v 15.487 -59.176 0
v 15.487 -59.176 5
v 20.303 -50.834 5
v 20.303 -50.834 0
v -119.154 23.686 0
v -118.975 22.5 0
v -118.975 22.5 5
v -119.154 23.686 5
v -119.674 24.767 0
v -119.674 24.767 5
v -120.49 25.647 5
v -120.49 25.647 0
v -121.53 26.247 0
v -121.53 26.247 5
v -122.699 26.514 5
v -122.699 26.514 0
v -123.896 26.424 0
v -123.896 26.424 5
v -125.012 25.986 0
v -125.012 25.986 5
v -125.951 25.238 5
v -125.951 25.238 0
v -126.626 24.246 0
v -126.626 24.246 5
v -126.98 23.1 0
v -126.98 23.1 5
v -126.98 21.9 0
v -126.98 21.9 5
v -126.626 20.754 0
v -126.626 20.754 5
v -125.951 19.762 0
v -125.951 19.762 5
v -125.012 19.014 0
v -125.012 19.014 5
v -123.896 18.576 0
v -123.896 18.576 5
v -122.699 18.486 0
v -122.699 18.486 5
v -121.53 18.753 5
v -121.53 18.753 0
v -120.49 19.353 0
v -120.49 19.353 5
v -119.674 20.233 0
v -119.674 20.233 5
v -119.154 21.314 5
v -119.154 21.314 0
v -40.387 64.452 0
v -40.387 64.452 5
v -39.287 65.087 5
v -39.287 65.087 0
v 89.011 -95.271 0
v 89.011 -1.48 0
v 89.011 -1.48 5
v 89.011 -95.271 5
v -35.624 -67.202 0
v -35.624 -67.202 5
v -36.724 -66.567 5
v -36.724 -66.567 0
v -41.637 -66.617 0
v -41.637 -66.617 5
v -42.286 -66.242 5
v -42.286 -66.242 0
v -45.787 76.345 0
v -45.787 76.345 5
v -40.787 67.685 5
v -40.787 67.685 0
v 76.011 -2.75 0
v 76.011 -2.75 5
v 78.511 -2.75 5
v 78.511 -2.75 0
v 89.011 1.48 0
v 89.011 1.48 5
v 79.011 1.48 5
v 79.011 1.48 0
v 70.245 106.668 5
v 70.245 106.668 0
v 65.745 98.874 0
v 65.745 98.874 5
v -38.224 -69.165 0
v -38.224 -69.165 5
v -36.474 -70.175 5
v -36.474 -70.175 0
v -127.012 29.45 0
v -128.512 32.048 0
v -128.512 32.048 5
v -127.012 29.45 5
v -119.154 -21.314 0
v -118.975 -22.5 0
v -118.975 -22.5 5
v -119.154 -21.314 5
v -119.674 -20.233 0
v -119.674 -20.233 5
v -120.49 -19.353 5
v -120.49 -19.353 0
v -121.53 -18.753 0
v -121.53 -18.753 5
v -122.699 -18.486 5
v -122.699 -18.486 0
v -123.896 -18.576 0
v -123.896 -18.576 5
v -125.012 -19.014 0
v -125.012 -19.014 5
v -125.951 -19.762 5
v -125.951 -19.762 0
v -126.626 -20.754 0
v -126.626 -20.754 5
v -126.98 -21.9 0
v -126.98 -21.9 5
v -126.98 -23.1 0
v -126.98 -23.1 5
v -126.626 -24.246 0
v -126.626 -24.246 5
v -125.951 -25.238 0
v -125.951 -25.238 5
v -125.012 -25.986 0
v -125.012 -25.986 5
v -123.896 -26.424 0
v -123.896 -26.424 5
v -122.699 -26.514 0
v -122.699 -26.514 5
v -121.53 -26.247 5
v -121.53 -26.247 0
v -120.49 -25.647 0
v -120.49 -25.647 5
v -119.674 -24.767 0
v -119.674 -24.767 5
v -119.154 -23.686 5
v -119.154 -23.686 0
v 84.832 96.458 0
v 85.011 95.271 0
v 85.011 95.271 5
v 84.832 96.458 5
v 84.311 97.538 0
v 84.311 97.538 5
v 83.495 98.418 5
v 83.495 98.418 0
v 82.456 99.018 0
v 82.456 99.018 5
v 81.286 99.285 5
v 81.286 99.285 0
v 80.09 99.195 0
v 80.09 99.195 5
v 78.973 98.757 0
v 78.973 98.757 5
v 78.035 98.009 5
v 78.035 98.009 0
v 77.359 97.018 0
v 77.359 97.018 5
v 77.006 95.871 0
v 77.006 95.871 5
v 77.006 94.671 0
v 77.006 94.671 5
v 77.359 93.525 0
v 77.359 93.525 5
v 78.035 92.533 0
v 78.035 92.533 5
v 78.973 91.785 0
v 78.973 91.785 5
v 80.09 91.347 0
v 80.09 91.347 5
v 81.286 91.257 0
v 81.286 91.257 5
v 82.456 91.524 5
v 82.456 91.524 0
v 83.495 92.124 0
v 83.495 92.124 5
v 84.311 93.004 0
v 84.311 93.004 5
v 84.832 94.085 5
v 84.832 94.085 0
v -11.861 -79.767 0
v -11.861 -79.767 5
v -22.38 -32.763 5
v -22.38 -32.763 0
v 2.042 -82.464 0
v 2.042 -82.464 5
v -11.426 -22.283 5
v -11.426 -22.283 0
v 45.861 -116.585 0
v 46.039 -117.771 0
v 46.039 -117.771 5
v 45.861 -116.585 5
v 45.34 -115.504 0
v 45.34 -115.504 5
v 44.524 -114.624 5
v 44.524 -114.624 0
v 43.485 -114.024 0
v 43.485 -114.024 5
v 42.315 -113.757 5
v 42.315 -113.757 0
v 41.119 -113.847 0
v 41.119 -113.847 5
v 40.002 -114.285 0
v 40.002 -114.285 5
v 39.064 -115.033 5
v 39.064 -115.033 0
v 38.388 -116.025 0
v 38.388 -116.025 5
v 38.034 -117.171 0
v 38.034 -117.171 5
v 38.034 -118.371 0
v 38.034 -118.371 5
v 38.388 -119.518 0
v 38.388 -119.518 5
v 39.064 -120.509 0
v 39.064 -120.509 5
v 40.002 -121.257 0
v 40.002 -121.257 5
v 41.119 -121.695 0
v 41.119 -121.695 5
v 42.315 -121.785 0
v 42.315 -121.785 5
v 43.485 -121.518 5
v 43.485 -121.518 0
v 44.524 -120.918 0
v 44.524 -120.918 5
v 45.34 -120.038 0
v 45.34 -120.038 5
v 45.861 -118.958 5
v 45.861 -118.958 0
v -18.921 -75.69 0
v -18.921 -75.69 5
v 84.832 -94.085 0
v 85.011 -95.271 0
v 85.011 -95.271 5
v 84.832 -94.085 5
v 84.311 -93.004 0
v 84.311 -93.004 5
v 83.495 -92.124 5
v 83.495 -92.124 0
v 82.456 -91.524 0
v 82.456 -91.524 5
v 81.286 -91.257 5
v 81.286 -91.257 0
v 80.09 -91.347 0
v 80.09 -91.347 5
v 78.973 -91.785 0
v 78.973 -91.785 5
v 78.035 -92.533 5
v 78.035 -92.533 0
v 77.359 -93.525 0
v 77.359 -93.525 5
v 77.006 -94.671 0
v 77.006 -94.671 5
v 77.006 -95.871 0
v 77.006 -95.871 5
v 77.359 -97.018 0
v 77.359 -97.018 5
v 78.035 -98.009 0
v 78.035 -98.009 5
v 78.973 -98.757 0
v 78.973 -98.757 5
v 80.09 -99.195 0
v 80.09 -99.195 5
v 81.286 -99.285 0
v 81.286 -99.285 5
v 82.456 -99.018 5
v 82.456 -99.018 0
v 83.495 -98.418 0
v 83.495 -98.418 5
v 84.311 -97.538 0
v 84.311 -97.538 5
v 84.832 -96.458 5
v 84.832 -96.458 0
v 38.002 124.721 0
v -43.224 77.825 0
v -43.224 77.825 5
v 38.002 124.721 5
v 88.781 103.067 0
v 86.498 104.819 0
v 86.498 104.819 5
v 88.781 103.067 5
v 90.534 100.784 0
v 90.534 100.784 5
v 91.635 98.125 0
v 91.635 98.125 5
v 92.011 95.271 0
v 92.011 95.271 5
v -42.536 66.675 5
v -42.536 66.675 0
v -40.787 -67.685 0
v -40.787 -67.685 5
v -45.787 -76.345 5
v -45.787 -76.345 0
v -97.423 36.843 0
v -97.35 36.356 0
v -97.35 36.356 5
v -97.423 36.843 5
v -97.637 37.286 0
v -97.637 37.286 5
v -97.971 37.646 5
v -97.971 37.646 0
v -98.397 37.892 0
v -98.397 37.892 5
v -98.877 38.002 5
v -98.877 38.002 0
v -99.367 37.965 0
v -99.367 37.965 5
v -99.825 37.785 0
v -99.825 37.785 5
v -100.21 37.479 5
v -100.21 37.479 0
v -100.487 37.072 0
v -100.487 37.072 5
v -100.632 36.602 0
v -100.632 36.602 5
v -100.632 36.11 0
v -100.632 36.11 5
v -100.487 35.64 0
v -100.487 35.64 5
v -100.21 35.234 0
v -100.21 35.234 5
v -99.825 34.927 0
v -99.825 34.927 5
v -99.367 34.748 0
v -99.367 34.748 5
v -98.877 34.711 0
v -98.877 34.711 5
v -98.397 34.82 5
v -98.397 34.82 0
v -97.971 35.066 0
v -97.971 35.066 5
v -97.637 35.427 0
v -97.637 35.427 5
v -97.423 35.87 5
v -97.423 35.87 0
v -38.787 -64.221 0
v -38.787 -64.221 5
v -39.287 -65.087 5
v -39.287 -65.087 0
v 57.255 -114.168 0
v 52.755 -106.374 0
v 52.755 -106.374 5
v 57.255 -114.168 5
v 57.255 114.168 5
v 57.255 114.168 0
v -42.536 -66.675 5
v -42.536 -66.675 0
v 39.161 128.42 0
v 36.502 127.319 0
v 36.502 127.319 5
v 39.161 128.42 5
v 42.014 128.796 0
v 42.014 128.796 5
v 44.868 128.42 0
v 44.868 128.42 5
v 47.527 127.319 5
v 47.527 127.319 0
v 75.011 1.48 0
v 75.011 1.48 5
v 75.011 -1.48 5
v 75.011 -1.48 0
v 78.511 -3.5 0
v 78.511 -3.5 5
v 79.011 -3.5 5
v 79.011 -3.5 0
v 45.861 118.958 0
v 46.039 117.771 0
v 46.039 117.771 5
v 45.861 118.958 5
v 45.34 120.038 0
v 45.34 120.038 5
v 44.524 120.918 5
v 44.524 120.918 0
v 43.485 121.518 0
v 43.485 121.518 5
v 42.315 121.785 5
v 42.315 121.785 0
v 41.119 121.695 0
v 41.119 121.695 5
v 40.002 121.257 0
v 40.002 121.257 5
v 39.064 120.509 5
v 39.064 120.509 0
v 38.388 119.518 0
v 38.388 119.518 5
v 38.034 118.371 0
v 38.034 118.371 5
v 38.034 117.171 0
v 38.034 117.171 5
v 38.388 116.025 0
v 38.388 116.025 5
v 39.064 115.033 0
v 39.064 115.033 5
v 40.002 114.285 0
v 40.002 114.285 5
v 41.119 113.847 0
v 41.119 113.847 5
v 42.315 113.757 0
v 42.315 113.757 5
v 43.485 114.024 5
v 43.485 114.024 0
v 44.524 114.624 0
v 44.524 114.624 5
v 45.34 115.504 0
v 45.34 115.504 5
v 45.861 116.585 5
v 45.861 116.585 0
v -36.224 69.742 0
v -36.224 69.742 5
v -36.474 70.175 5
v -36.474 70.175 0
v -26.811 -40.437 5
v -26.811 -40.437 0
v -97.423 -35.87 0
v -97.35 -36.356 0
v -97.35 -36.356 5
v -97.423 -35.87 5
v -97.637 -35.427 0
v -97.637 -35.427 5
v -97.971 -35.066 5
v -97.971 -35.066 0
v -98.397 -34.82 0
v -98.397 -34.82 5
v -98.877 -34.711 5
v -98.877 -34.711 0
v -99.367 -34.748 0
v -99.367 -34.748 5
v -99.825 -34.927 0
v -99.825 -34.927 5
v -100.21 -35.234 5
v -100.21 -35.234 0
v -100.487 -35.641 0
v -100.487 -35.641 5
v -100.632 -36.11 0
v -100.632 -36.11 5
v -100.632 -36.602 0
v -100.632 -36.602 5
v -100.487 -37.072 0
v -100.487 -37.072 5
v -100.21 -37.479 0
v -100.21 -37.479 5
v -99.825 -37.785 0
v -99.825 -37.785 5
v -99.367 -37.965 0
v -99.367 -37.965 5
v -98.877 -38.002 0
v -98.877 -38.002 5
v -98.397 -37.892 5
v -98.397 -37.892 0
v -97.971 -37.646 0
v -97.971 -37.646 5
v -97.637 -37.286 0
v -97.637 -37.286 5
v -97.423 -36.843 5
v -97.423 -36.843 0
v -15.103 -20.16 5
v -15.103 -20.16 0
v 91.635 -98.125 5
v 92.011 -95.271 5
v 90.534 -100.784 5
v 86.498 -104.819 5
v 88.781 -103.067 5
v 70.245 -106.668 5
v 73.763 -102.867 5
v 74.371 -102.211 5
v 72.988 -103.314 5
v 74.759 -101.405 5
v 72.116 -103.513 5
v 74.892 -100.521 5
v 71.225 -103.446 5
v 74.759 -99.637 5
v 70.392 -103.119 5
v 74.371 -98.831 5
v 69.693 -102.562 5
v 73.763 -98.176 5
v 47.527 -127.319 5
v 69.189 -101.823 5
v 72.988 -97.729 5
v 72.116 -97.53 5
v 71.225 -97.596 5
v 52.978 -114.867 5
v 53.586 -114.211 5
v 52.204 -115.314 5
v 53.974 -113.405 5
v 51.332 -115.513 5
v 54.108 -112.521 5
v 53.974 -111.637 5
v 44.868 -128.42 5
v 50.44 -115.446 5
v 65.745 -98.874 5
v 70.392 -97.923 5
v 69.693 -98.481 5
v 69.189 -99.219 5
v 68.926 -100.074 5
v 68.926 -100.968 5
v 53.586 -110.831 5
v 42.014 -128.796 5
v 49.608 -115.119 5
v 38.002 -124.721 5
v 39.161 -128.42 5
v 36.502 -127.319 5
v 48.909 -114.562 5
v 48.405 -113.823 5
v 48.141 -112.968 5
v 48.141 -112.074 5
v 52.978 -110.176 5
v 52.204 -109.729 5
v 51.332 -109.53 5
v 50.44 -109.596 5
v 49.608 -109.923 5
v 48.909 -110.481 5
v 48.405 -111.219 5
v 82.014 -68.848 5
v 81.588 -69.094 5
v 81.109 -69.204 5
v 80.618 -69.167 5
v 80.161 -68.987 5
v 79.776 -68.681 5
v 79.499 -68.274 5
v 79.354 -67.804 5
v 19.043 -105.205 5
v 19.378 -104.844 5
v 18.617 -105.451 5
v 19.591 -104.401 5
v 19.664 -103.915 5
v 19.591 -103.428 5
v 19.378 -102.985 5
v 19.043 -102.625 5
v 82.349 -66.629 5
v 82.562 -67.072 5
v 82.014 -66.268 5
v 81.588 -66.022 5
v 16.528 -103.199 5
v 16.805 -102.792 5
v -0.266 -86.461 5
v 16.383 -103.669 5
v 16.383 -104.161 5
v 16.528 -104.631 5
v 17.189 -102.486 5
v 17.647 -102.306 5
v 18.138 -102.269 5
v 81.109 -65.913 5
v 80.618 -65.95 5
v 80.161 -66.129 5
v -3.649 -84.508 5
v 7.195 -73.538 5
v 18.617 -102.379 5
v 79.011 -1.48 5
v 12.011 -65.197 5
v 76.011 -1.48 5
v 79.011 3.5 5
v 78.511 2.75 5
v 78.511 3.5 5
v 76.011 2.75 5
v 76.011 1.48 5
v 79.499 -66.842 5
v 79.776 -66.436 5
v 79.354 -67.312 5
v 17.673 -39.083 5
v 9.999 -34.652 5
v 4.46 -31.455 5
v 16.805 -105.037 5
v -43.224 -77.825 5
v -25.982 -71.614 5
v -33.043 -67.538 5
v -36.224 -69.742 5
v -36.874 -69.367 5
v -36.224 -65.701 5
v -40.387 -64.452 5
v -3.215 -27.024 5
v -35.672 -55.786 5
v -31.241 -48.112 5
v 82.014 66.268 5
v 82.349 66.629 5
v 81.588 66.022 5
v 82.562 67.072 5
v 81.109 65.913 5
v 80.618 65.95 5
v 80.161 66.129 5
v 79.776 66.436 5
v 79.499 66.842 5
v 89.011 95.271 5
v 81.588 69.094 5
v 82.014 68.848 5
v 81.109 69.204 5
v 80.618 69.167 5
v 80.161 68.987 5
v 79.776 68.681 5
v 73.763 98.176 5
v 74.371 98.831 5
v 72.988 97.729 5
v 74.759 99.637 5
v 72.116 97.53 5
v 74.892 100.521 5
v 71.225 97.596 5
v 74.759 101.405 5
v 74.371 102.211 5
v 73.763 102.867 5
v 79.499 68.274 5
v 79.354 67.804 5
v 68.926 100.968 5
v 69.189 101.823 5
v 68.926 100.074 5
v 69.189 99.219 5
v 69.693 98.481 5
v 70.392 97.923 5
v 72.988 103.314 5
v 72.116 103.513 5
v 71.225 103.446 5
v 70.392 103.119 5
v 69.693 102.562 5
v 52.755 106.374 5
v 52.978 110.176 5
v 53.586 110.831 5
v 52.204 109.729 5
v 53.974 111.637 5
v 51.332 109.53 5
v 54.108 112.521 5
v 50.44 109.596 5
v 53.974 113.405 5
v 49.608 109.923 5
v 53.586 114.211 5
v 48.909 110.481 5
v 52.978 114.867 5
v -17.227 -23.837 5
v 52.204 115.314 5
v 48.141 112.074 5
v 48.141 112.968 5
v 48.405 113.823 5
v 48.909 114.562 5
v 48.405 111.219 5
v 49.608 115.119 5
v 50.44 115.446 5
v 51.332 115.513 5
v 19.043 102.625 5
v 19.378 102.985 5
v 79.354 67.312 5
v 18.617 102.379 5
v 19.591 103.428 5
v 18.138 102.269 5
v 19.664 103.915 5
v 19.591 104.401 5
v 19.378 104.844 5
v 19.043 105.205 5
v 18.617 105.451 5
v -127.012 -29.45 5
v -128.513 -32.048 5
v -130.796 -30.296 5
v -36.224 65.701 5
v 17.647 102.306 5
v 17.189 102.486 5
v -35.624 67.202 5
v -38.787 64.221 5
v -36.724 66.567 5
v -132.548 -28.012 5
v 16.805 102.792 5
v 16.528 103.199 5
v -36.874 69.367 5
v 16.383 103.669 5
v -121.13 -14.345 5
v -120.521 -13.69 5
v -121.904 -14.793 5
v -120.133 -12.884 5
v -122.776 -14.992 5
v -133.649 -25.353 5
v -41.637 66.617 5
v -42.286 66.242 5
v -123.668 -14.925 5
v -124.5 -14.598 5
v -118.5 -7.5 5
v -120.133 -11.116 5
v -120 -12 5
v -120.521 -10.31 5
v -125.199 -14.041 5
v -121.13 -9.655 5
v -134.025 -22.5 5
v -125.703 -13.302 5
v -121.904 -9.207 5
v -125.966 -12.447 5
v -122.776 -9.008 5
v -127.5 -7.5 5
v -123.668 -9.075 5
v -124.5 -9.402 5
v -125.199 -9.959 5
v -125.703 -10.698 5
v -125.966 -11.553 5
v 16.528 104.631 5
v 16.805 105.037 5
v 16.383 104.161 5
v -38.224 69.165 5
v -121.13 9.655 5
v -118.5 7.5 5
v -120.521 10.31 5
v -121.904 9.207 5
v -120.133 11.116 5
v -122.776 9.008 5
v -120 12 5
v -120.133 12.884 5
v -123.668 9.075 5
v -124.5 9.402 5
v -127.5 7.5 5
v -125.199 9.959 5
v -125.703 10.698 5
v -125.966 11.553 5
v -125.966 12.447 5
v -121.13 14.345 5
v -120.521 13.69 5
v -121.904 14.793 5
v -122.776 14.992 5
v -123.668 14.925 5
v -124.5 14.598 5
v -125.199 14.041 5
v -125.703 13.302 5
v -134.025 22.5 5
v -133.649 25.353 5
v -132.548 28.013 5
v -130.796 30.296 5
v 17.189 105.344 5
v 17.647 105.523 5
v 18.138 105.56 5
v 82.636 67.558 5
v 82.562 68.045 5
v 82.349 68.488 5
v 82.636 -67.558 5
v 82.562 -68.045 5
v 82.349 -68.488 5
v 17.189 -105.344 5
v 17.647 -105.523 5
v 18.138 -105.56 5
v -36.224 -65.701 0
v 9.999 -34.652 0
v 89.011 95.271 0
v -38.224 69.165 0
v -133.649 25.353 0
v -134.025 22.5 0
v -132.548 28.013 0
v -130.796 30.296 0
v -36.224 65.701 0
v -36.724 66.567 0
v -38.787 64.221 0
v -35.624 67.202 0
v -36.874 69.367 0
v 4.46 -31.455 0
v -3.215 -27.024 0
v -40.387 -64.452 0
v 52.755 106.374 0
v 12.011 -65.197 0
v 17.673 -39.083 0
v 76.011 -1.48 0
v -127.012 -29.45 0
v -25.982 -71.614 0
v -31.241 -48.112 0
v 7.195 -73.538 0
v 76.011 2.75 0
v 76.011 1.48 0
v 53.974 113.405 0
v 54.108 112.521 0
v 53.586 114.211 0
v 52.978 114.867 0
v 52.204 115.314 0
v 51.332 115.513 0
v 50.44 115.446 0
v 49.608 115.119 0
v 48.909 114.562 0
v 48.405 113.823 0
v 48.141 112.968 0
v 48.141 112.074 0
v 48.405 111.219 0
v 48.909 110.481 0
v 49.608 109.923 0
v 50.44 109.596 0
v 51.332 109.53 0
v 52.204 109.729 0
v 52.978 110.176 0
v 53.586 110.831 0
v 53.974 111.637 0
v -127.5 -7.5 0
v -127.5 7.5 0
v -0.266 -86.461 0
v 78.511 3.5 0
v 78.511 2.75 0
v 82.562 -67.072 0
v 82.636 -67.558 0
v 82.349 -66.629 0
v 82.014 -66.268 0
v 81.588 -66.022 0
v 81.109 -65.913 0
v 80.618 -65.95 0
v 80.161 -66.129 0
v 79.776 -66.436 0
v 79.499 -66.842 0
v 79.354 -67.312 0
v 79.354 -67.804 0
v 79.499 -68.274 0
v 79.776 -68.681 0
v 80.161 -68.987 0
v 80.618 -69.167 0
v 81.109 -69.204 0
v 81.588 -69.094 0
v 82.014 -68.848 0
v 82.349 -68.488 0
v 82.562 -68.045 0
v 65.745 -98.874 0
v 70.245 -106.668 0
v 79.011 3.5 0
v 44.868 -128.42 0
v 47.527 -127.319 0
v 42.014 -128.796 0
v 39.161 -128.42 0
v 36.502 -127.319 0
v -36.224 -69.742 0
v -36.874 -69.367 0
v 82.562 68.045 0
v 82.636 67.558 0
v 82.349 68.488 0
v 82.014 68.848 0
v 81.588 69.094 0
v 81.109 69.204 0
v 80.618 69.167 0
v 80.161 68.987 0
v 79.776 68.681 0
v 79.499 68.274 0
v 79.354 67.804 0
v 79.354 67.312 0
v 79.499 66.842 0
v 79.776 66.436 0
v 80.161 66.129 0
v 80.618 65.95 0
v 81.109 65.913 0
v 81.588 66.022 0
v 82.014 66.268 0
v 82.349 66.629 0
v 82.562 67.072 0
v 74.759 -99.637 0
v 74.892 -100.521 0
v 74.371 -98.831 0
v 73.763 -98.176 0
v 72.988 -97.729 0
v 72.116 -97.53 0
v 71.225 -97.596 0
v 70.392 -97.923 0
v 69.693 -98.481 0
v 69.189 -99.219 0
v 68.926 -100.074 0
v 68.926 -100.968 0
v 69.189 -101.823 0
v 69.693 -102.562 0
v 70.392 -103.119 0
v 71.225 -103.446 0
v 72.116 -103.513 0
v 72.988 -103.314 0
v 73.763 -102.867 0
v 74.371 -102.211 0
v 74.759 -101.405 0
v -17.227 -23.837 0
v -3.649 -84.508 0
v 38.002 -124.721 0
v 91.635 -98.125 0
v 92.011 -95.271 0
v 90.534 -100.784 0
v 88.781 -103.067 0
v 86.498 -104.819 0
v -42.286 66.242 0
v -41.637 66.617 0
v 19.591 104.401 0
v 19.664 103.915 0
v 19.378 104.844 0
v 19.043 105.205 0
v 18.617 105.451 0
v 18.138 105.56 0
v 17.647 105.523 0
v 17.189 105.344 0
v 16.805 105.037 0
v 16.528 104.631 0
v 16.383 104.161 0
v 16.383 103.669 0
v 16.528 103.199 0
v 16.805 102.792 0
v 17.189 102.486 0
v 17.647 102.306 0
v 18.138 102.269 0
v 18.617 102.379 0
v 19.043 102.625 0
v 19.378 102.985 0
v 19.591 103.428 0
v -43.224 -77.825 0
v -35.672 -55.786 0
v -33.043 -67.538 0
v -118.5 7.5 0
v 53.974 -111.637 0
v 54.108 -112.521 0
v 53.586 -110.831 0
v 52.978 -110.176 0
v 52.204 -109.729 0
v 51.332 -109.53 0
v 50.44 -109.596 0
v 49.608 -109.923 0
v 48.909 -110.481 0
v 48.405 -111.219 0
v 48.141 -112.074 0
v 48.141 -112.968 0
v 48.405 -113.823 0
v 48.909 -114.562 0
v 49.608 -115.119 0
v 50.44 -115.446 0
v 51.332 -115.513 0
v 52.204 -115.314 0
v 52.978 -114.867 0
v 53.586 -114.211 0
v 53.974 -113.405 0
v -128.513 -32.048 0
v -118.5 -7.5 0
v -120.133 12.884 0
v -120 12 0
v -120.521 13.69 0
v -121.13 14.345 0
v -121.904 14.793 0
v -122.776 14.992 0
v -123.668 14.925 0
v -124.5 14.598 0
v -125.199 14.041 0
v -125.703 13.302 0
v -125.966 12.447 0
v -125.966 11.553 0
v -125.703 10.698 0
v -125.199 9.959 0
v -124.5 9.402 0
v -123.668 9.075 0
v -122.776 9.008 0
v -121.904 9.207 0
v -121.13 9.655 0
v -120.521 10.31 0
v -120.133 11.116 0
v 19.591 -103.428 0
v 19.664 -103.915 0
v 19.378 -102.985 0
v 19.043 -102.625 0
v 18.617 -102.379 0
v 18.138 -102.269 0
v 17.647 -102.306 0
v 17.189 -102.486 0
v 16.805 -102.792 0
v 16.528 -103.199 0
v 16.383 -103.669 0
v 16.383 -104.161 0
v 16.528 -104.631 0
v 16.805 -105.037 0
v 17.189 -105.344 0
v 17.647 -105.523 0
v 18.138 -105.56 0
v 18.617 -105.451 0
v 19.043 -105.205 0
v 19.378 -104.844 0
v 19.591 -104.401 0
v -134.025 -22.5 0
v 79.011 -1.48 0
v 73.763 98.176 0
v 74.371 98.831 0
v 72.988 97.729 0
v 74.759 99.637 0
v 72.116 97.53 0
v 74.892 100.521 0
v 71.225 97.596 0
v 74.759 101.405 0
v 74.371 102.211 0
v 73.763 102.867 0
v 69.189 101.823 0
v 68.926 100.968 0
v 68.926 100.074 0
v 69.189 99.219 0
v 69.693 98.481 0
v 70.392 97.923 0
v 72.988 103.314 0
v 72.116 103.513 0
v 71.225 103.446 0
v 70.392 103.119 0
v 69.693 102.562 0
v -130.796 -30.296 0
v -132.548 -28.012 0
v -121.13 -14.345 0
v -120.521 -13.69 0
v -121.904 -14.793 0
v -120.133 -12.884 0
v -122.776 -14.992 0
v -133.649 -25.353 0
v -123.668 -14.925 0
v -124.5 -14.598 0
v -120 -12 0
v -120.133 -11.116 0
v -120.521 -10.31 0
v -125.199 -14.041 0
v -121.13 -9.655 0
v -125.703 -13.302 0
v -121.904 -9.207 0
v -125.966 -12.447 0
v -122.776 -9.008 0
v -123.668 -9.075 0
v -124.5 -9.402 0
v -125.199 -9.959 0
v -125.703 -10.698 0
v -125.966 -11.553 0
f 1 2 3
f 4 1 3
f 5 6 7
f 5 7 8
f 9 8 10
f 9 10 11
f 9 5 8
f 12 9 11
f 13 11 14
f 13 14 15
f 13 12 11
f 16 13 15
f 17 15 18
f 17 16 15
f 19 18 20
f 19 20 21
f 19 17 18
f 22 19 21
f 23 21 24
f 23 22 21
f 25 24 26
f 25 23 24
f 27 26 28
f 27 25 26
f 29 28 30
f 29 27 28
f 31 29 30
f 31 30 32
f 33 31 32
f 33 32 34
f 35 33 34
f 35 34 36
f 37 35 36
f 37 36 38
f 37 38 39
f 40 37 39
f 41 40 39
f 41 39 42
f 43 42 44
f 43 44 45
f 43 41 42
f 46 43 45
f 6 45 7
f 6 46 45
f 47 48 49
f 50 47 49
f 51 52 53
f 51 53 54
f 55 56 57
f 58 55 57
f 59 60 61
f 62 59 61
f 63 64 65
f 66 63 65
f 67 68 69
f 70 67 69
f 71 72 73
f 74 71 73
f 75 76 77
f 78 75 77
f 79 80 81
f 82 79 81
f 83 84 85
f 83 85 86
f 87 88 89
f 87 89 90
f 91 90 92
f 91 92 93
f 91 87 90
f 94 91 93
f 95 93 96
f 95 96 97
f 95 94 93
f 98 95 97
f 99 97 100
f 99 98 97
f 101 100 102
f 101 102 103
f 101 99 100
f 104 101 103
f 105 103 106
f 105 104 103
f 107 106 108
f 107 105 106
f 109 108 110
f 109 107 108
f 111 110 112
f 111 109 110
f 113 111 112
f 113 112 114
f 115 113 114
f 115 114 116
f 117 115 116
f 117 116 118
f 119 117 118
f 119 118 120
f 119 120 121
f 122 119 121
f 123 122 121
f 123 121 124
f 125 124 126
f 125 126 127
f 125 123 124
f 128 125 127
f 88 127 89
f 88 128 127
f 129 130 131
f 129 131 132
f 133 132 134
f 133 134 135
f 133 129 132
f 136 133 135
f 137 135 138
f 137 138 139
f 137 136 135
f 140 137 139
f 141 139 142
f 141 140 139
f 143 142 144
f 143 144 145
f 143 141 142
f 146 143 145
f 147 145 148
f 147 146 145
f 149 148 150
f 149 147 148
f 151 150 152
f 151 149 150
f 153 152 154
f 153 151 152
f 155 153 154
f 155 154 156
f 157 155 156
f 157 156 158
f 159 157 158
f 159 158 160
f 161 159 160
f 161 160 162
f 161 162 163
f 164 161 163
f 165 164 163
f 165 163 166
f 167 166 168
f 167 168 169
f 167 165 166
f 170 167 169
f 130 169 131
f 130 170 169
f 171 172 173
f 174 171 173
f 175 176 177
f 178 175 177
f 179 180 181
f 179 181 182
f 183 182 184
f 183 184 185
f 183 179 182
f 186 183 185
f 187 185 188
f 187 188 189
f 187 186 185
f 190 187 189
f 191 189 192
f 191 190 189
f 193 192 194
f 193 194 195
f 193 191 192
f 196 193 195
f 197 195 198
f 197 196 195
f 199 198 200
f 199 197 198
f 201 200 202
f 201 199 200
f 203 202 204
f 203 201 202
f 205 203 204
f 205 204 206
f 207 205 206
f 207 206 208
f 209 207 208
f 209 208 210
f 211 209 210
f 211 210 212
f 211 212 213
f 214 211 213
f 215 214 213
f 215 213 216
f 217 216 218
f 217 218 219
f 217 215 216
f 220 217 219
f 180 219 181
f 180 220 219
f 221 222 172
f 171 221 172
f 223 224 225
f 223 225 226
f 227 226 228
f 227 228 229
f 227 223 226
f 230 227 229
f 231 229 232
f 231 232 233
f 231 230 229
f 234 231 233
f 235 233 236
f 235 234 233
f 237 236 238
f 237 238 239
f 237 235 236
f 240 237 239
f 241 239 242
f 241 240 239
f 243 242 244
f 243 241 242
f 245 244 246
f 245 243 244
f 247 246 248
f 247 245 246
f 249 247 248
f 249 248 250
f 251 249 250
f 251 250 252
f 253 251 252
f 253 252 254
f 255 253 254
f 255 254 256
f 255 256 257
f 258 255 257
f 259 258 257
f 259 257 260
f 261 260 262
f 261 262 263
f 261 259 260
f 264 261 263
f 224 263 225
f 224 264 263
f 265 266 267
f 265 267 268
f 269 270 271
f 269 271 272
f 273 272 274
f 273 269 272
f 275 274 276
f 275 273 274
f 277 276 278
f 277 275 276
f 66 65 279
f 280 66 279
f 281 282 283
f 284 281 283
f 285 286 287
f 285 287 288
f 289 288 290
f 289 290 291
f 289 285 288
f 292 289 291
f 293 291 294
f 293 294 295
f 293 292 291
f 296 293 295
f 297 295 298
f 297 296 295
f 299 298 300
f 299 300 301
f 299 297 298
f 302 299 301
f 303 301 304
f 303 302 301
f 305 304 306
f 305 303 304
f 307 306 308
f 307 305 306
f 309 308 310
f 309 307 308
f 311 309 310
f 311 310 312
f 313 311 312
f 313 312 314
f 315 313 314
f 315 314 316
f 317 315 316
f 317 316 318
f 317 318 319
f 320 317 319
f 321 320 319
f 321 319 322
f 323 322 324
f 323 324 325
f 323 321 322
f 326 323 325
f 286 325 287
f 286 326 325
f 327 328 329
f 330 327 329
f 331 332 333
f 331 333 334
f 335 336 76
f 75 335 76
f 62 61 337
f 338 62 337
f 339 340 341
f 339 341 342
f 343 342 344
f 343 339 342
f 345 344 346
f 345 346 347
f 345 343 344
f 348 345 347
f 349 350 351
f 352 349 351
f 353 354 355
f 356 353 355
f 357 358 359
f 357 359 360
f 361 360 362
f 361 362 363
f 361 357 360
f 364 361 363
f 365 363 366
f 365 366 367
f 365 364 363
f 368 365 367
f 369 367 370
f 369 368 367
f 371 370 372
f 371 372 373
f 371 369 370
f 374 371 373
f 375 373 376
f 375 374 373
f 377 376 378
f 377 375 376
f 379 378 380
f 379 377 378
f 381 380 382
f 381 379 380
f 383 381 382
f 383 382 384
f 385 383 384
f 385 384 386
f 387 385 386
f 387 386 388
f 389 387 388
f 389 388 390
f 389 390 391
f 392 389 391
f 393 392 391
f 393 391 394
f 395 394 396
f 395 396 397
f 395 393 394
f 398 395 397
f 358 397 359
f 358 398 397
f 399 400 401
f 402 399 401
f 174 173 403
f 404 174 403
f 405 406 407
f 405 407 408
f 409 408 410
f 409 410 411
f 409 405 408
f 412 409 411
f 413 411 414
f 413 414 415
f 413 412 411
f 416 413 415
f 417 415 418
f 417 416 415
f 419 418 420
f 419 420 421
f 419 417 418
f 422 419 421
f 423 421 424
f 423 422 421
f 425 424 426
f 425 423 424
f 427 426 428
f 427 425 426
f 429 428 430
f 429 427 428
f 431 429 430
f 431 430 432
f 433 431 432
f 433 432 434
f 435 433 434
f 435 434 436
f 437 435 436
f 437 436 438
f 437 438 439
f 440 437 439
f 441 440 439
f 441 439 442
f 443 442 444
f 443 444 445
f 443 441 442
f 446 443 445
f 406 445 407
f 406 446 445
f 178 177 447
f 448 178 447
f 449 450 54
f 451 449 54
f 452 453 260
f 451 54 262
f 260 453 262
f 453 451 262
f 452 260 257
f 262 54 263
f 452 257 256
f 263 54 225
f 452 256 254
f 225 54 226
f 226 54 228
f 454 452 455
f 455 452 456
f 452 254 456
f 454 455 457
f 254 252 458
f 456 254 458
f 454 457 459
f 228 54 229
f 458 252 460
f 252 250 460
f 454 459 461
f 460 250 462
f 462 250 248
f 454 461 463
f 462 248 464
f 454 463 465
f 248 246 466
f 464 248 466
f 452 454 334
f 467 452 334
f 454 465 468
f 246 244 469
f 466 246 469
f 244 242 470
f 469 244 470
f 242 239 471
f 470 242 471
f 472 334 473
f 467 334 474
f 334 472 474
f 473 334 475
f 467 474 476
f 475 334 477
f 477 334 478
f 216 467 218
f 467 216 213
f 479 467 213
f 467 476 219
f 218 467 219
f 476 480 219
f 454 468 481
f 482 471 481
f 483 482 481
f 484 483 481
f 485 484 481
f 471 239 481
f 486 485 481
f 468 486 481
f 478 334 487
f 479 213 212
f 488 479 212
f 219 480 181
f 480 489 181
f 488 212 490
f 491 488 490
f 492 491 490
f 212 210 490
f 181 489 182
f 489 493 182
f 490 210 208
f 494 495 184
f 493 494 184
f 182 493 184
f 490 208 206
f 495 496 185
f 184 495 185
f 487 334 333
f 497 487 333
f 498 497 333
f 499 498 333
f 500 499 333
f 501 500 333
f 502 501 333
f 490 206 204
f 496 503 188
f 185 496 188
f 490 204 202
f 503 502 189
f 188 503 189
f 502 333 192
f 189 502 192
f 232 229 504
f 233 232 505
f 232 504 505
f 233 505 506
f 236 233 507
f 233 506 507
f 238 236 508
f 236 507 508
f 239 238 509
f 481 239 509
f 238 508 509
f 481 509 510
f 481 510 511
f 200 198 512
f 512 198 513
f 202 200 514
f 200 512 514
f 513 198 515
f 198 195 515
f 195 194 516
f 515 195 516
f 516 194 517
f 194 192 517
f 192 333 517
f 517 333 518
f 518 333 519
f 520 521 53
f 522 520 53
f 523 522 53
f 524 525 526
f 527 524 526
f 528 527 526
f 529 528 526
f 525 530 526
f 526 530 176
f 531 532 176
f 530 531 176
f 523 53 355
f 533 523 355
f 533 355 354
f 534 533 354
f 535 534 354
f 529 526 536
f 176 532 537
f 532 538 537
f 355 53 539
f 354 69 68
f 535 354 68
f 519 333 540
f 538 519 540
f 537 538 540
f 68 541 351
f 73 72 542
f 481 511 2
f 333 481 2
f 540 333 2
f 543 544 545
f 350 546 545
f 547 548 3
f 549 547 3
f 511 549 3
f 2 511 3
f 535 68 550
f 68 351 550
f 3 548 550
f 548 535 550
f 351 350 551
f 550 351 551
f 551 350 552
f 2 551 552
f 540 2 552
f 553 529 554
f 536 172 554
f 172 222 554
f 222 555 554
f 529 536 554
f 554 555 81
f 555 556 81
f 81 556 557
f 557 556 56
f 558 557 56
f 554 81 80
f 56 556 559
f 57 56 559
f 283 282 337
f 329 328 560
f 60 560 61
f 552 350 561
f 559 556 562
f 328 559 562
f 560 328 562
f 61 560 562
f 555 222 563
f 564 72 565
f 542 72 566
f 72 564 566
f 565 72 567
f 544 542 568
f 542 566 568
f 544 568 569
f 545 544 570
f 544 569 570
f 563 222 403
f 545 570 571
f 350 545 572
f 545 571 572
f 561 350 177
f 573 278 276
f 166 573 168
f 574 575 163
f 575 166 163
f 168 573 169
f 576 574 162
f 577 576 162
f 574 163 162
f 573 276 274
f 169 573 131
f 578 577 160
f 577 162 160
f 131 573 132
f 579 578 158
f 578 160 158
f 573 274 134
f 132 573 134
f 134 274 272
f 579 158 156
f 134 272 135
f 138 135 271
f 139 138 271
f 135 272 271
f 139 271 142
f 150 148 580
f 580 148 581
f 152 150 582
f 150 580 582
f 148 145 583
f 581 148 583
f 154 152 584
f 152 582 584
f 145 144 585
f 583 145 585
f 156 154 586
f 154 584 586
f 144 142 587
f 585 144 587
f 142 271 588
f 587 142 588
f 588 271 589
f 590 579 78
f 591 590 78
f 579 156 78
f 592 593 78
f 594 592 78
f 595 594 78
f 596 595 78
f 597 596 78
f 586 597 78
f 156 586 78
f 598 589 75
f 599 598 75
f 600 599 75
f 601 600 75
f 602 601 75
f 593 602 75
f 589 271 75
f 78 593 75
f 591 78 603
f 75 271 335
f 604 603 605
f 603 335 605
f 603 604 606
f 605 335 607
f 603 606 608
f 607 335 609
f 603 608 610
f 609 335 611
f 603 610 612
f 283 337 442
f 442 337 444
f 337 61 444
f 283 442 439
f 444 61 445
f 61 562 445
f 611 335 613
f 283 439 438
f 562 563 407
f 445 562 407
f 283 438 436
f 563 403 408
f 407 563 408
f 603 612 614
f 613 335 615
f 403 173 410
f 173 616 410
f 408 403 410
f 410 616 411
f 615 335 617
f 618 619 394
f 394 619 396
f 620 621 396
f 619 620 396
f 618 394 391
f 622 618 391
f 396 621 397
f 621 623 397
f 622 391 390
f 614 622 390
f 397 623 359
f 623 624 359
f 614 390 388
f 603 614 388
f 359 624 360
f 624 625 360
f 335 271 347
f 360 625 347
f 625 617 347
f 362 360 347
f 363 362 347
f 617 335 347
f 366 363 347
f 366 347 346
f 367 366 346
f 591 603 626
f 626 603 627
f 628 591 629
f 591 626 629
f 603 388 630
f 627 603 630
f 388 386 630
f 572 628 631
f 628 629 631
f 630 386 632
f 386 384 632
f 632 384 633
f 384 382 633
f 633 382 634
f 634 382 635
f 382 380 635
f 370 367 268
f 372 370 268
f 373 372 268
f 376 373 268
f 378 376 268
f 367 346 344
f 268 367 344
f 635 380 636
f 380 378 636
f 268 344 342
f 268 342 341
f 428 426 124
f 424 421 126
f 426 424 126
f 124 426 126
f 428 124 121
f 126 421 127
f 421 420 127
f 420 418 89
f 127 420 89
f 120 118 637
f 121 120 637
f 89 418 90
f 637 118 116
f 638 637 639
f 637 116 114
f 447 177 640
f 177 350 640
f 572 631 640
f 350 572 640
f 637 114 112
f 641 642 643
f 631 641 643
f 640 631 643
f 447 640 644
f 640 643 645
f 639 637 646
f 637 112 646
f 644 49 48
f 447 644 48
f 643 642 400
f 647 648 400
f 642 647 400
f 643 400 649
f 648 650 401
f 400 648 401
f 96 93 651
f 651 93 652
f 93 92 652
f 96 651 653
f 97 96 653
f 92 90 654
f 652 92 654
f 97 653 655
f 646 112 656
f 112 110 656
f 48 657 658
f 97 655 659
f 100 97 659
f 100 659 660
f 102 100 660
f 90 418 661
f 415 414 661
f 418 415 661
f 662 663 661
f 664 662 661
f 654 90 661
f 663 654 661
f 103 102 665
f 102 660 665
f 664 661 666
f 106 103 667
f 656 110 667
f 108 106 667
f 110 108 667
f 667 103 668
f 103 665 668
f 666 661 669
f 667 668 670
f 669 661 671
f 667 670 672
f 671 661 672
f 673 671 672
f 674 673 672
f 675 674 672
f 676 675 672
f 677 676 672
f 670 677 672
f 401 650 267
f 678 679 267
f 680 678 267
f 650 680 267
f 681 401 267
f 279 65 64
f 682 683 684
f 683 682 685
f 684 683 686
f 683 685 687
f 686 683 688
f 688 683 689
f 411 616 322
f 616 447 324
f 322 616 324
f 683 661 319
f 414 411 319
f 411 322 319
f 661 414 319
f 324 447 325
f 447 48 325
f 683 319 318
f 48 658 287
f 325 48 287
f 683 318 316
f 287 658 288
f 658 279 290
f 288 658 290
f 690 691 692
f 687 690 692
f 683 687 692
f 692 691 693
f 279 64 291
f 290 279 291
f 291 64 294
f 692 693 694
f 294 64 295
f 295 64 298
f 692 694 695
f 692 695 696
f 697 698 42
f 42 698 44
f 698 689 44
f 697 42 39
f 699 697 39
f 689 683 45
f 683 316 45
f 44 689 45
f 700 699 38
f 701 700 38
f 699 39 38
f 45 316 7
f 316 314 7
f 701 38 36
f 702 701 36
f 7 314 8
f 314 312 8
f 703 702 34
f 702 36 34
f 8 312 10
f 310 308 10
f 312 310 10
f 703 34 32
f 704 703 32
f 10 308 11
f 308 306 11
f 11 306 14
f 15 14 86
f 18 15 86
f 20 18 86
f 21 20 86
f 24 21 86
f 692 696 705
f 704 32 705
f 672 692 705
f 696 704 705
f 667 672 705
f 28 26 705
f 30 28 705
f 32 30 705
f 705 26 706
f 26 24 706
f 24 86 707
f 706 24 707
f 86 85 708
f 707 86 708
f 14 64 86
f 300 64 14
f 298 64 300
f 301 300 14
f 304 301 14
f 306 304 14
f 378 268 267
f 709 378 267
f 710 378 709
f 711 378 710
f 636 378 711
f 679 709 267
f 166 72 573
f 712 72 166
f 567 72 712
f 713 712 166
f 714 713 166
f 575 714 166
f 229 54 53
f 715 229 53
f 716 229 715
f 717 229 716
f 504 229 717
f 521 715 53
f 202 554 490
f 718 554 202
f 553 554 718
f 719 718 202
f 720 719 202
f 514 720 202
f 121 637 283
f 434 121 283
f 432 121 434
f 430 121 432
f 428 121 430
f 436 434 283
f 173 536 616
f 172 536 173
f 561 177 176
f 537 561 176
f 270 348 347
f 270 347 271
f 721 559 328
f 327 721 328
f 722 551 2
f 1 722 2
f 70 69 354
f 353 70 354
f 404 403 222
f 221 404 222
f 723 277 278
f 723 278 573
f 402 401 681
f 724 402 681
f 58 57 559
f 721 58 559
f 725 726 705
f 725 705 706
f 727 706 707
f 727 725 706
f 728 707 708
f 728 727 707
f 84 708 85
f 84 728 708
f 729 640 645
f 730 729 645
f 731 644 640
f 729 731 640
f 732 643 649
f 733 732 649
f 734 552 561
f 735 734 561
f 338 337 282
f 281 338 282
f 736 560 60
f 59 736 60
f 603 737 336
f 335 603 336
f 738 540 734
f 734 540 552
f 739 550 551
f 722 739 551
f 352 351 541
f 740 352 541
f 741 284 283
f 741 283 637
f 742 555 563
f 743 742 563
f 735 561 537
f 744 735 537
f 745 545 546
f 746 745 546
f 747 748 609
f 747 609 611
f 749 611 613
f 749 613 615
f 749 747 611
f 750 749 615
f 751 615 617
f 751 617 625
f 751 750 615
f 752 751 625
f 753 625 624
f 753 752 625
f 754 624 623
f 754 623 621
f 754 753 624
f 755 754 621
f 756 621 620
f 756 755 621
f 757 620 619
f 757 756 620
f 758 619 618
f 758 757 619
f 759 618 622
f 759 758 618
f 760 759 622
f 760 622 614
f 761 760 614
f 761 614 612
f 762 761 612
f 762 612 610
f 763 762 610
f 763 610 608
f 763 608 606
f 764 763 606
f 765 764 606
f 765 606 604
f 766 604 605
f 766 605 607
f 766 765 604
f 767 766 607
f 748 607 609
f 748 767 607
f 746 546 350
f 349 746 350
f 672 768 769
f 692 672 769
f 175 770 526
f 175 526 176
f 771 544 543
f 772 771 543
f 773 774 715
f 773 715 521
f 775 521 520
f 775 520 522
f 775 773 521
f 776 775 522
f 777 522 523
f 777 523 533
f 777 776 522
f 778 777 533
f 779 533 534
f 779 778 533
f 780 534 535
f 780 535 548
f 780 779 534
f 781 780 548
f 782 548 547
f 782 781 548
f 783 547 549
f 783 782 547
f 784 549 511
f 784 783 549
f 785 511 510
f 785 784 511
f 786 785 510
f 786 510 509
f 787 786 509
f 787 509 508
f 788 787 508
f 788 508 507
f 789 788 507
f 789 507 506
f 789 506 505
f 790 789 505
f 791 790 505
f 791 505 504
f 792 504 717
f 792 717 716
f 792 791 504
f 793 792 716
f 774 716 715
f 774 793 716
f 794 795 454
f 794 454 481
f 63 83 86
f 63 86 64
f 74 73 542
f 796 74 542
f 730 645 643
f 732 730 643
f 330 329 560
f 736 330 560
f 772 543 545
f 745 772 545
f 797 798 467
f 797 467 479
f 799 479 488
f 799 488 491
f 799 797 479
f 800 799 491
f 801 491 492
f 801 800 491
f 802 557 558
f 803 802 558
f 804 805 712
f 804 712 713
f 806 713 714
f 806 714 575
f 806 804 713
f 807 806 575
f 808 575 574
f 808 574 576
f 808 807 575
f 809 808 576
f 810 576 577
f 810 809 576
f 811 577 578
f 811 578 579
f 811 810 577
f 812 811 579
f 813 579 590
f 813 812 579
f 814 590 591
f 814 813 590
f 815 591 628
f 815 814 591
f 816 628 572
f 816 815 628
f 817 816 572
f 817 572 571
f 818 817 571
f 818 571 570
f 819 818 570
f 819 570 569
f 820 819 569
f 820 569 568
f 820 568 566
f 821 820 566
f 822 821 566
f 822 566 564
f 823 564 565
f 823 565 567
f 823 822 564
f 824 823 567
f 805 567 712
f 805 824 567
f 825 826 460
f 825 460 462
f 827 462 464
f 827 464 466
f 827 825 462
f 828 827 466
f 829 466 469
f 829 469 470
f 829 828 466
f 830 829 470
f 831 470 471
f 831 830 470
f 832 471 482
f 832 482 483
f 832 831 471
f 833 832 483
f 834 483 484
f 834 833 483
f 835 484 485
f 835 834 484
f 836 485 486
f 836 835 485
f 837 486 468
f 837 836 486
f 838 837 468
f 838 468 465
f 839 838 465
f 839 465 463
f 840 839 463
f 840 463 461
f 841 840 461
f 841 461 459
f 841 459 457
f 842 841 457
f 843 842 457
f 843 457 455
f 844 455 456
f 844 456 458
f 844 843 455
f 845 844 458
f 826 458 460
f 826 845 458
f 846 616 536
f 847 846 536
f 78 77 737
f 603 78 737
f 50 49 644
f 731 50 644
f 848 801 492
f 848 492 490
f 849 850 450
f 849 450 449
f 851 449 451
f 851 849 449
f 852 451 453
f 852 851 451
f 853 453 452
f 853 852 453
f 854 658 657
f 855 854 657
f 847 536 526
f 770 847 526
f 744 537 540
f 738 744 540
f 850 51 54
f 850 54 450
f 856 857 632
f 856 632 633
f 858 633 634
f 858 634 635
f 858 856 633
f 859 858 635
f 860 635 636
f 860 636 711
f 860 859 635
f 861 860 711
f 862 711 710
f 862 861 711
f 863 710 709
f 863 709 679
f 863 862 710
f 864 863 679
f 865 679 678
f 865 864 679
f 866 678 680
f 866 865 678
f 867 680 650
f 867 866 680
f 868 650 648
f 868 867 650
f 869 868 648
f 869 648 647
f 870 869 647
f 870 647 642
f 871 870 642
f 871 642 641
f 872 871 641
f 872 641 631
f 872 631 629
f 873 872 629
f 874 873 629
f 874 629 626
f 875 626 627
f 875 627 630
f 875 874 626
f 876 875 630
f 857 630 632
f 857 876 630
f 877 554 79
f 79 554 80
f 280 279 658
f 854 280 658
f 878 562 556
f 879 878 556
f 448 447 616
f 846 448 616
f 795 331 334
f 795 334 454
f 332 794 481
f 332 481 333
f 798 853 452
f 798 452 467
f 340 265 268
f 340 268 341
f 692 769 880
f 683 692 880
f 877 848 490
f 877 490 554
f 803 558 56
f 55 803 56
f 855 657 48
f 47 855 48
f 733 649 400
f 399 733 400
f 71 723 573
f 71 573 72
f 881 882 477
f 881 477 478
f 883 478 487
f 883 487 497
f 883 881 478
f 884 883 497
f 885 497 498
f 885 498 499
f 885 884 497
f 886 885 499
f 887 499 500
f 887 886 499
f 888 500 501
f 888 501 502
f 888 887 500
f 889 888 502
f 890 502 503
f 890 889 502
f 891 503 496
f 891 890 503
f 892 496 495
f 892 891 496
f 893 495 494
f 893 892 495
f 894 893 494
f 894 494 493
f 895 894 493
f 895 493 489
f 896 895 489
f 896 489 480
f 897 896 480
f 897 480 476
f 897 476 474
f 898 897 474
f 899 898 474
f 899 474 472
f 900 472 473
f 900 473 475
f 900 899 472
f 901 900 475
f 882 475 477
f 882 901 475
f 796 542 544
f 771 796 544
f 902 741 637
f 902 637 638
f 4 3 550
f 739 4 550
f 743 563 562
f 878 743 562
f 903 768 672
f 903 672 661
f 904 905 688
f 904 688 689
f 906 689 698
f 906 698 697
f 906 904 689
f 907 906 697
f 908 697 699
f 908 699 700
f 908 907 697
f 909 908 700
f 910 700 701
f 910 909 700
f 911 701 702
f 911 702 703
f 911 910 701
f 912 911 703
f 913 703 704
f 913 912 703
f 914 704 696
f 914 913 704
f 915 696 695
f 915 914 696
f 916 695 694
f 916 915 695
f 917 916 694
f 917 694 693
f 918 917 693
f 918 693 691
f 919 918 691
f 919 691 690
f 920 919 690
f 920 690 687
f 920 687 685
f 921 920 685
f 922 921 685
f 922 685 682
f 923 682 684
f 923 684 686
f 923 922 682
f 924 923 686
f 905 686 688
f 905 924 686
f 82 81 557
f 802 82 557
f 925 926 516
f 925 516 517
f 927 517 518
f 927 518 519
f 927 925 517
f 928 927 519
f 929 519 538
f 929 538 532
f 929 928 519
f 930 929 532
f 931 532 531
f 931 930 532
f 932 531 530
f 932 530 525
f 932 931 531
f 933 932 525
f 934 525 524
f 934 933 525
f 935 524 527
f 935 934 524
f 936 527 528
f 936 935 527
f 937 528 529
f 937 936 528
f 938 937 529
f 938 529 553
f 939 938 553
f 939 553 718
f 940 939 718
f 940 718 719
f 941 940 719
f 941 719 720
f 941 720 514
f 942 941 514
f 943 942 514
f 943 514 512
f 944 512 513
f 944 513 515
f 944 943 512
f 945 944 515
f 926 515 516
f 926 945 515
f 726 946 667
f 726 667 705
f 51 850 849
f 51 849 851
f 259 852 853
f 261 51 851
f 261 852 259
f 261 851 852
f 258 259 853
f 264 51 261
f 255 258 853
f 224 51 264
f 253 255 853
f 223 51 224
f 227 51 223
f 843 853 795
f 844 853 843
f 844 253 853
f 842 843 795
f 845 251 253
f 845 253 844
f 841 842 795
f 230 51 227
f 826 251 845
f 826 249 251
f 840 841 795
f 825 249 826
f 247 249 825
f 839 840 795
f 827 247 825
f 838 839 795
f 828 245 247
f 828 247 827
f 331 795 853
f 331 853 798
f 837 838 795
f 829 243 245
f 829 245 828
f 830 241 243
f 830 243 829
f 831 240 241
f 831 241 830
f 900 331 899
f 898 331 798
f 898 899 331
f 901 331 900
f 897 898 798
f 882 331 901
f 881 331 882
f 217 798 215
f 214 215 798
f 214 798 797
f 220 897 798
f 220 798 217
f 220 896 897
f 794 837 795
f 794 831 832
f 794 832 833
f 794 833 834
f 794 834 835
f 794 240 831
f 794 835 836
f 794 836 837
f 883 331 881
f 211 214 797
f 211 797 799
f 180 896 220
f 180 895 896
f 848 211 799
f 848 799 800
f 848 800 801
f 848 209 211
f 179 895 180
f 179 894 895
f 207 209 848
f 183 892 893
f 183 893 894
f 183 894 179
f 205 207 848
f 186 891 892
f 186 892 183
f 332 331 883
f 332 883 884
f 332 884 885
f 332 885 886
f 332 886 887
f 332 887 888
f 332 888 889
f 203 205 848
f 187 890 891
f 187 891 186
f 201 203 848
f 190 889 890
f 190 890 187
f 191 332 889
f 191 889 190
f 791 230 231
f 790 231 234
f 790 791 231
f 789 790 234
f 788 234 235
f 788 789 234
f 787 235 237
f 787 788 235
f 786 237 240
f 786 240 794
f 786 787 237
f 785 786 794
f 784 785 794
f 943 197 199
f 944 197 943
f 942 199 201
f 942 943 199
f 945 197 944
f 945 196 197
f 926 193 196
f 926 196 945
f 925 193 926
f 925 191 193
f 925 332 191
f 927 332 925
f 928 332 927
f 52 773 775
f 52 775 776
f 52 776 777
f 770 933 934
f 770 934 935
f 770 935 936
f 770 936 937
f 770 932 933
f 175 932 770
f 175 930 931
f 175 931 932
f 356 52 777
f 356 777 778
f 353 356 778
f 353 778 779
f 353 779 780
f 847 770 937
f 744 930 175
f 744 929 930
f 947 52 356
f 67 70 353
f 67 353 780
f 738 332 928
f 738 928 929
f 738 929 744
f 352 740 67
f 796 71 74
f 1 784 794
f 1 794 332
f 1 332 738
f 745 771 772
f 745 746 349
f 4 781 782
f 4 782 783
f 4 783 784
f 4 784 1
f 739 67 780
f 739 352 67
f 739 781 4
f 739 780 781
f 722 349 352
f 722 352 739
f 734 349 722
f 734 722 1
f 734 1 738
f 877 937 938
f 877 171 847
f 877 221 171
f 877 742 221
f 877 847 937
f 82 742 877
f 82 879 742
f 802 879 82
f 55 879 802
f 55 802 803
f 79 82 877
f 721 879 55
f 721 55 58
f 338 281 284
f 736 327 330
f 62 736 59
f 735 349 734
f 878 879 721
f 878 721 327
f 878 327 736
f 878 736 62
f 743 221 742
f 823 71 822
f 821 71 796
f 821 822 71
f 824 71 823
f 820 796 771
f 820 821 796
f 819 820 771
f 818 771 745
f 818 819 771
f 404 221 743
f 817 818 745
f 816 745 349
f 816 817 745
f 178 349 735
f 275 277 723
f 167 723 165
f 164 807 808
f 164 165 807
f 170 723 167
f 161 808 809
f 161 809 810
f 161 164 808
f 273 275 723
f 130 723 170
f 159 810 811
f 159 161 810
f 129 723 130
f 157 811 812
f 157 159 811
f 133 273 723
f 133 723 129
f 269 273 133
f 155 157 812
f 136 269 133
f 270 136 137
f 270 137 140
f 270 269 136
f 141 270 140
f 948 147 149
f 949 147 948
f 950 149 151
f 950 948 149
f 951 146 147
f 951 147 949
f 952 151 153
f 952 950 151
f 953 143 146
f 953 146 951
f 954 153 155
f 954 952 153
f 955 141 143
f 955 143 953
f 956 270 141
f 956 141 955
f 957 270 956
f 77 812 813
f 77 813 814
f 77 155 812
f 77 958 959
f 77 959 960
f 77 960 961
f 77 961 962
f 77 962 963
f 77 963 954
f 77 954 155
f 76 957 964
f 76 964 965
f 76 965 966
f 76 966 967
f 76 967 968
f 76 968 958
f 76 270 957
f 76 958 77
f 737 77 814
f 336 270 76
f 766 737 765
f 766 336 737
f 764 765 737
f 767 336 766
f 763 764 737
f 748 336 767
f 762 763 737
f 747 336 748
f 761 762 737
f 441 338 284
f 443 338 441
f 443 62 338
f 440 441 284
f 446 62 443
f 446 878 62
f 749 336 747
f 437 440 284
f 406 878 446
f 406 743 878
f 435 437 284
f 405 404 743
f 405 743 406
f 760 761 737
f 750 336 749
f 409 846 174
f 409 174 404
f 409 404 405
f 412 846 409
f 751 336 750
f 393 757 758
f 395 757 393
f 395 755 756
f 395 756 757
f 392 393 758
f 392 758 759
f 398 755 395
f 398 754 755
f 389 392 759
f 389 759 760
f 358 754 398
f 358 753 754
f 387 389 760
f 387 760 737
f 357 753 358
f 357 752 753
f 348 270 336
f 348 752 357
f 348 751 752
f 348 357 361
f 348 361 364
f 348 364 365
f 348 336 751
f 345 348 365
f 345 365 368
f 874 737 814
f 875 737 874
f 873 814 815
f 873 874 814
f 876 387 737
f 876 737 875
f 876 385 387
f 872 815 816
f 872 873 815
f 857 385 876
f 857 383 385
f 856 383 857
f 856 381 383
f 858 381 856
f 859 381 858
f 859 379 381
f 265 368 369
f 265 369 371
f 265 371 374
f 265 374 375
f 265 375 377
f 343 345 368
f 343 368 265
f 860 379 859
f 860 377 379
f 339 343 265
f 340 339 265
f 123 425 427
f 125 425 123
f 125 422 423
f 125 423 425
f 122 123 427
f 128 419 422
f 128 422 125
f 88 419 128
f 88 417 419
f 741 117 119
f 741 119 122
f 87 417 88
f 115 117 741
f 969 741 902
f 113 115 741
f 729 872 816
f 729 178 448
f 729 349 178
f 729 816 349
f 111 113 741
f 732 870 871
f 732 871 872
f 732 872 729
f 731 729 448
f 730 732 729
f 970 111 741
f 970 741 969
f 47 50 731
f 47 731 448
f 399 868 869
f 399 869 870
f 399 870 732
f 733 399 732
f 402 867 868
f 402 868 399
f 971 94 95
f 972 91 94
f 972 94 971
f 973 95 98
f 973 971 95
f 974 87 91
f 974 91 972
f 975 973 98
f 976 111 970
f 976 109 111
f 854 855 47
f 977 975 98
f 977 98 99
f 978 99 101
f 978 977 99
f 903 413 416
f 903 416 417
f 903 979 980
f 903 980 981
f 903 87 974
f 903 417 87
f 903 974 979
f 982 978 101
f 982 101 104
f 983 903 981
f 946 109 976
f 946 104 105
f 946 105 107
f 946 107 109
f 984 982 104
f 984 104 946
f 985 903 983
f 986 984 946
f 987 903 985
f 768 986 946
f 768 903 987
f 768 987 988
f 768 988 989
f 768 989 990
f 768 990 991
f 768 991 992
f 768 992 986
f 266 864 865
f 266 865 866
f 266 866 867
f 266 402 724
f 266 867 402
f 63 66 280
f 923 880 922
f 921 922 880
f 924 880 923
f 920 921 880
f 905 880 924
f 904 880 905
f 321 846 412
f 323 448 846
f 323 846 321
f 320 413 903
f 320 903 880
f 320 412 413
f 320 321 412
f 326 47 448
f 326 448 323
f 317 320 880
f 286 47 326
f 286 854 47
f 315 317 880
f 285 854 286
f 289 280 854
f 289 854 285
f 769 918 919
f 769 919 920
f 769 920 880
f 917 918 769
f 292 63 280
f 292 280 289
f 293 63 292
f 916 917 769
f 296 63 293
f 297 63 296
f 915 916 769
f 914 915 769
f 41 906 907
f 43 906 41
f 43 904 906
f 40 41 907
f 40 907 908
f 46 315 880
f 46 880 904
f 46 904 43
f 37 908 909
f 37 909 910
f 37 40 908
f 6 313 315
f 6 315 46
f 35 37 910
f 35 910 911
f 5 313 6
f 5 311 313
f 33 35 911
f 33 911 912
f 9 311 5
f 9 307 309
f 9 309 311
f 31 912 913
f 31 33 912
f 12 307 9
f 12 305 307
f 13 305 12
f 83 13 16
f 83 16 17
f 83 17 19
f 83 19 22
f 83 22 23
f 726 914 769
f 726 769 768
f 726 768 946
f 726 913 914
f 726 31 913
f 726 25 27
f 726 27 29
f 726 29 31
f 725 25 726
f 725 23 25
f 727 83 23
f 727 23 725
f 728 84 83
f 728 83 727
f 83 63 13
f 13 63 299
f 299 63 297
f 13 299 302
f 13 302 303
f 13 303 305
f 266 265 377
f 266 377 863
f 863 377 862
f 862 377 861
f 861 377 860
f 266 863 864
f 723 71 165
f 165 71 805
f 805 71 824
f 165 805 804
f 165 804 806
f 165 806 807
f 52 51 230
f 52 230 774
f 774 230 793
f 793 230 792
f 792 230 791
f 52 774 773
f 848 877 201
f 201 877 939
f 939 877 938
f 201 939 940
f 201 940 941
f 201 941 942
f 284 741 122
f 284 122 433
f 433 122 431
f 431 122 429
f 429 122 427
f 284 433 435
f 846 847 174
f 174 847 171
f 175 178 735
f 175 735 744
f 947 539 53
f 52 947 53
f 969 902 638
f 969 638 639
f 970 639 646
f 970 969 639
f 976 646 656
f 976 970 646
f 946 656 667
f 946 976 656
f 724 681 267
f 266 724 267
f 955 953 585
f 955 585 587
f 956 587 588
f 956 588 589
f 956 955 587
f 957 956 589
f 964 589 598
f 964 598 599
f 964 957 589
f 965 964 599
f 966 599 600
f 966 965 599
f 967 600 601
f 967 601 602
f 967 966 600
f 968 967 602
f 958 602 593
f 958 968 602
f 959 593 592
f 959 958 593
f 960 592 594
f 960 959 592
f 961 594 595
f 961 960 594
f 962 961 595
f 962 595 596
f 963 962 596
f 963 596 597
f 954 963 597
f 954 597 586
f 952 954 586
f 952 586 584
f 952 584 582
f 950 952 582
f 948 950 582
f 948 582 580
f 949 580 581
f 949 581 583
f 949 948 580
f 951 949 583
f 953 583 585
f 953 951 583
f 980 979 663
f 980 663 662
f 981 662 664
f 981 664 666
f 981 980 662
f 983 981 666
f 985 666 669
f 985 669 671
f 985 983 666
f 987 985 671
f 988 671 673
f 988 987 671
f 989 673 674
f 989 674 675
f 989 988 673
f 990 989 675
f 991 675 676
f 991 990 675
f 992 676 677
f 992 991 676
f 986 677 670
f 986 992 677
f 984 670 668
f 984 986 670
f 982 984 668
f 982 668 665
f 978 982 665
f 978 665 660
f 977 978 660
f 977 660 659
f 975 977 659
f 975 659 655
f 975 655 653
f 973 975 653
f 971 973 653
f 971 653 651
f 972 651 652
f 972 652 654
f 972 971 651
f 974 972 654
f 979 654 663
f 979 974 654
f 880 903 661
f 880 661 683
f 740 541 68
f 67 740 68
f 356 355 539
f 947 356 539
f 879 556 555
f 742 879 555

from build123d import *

# Parameters (mm, degrees)
SKETCH1_R           = 4.025
SKETCH1_R_2         = 1.65
SKETCH1_R_3         = 3
SKETCH1_W           = 9
SKETCH1_H           = 15
BOSS_EXTRUDE1_DEPTH = 5
CUT_EXTRUDE1_DEPTH  = 186.946611569
CUT_EXTRUDE2_DEPTH  = 186.946611569


with BuildPart() as part:
    # Sketch1 → Boss-Extrude1 (new body)
    with BuildSketch(Plane.XY):
        with BuildLine():
            Line((-127.0125, 29.449853865), (38.001928415, 124.720978531))
            Line((38.001928415, 124.720978531), (36.501928415, 127.319054742))
            ThreePointArc((36.501928415, 127.319054742), (42.014428415, 128.796124665), (47.526928415, 127.319054742))
            Line((47.526928415, 127.319054742), (86.498071585, 104.819054742))
            ThreePointArc((86.498071585, 104.819054742), (90.533501662, 100.783624665), (92.010571585, 95.271124665))
            Line((92.010571585, 95.271124665), (89.010571585, 95.271124665))
            Line((89.010571585, 95.271124665), (89.010571585, -95.271124665))
            Line((89.010571585, -95.271124665), (92.010571585, -95.271124665))
            ThreePointArc((92.010571585, -95.271124665), (90.533501662, -100.783624665), (86.498071585, -104.819054742))
            Line((86.498071585, -104.819054742), (47.526928415, -127.319054742))
            ThreePointArc((47.526928415, -127.319054742), (42.014427779, -128.796124665), (36.501927313, -127.319054106))
            Line((36.501927313, -127.319054106), (38.001927613, -124.720978068))
            Line((38.001927613, -124.720978068), (-127.012489808, -29.44983436))
            Line((-127.012489808, -29.44983436), (-128.512501102, -32.047929441))
            ThreePointArc((-128.512501102, -32.047929441), (-132.547930395, -28.012499449), (-134.025, -22.5))
            Line((-134.025, -22.5), (-134.025, 22.5))
            ThreePointArc((-134.025, 22.5), (-132.547930077, 28.0125), (-128.5125, 32.047930077))
            Line((-128.5125, 32.047930077), (-127.0125, 29.449853865))
        make_face()
        with Locations((-123, 22.5)):
            Circle(SKETCH1_R, mode=Mode.SUBTRACT)
        with Locations((-123, -22.5)):
            Circle(SKETCH1_R, mode=Mode.SUBTRACT)
        with Locations((42.014428415, 117.771124665)):
            Circle(SKETCH1_R, mode=Mode.SUBTRACT)
        with Locations((80.985571585, 95.271124665)):
            Circle(SKETCH1_R, mode=Mode.SUBTRACT)
        with Locations((80.985571585, -95.271124665)):
            Circle(SKETCH1_R, mode=Mode.SUBTRACT)
        with Locations((42.014428415, -117.771124665)):
            Circle(SKETCH1_R, mode=Mode.SUBTRACT)
        with Locations((-99, 36.356406461)):
            Circle(SKETCH1_R_2, mode=Mode.SUBTRACT)
        with Locations((-99, -36.356410153)):
            Circle(SKETCH1_R_2, mode=Mode.SUBTRACT)
        with Locations((80.985571585, 67.558311744)):
            Circle(SKETCH1_R_2, mode=Mode.SUBTRACT)
        with Locations((18.014425217, 103.914720051)):
            Circle(SKETCH1_R_2, mode=Mode.SUBTRACT)
        with Locations((18.014428415, -103.914718205)):
            Circle(SKETCH1_R_2, mode=Mode.SUBTRACT)
        with Locations((80.985574783, -67.558309898)):
            Circle(SKETCH1_R_2, mode=Mode.SUBTRACT)
        with Locations((-123, 12)):
            Circle(SKETCH1_R_3, mode=Mode.SUBTRACT)
        with Locations((-123, -12)):
            Circle(SKETCH1_R_3, mode=Mode.SUBTRACT)
        with Locations((71.892304845, 100.521124665)):
            Circle(SKETCH1_R_3, mode=Mode.SUBTRACT)
        with Locations((51.107695155, 112.521124665)):
            Circle(SKETCH1_R_3, mode=Mode.SUBTRACT)
        with Locations((51.107695155, -112.521124665)):
            Circle(SKETCH1_R_3, mode=Mode.SUBTRACT)
        with Locations((71.892304845, -100.521124665)):
            Circle(SKETCH1_R_3, mode=Mode.SUBTRACT)
        Polygon((57.254809472, -114.168238983), (70.245190528, -106.668238983), (65.745190528, -98.874010348), (52.754809472, -106.374010348), align=None, mode=Mode.SUBTRACT)
        with Locations((-123, 0)):
            Rectangle(SKETCH1_W, SKETCH1_H, mode=Mode.SUBTRACT)
        Polygon((65.745190528, 98.874010348), (52.754809472, 106.374010348), (57.254809472, 114.168238983), (70.245190528, 106.668238983), align=None, mode=Mode.SUBTRACT)
    extrude(amount=BOSS_EXTRUDE1_DEPTH)

    # Sketch2 → Cut-Extrude1 (cut, through all)
    with BuildSketch(Plane.XY.offset(5)):
        Polygon((89.010571585, 1.48), (79.010571585, 1.48), (79.010571585, 3.5), (78.510571585, 3.5), (78.510571585, 2.75), (76.010571585, 2.75), (76.010571585, 1.48), (75.010571585, 1.48), (75.010571585, -1.48), (76.010571585, -1.48), (76.010571585, -2.75), (78.510571585, -2.75), (78.510571585, -3.5), (79.010571585, -3.5), (79.010571585, -1.48), (89.010571585, -1.48), align=None)
        Polygon((-43.223568195, -77.825416198), (-38.223568195, -69.16516216), (-36.474196879, -70.17516216), (-36.224196879, -69.742149458), (-36.873715932, -69.367149458), (-35.623715932, -67.202085949), (-36.723568195, -66.567085949), (-36.223568195, -65.701060545), (-38.78700339, -64.221060545), (-39.28700339, -65.087085949), (-40.386855653, -64.452085949), (-41.636855653, -66.617149458), (-42.286374706, -66.242149458), (-42.536374706, -66.67516216), (-40.78700339, -67.68516216), (-45.78700339, -76.345416198), align=None)
        Polygon((-45.78700339, 76.345416198), (-40.78700339, 67.68516216), (-42.536374706, 66.67516216), (-42.286374706, 66.242149458), (-41.636855653, 66.617149458), (-40.386855653, 64.452085949), (-39.28700339, 65.087085949), (-38.78700339, 64.221060545), (-36.223568195, 65.701060545), (-36.723568195, 66.567085949), (-35.623715932, 67.202085949), (-36.873715932, 69.367149458), (-36.224196879, 69.742149458), (-36.474196879, 70.17516216), (-38.223568195, 69.16516216), (-43.223568195, 77.825416198), align=None)
    extrude(amount=-CUT_EXTRUDE1_DEPTH, mode=Mode.SUBTRACT)

    # Sketch3 → Cut-Extrude2 (cut, through all)
    with BuildSketch(Plane.XY.offset(5)):
        Polygon((-35.672418314, -55.786425681), (-33.042712773, -67.537516271), (-25.982061715, -71.613986146), (-31.241472797, -48.111804967), align=None)
        Polygon((-26.810527281, -40.437184252), (-18.921410657, -75.690456022), (-11.8607596, -79.766925897), (-22.379581764, -32.762563537), align=None)
        Polygon((-17.226520227, -23.837201518), (-3.649426542, -84.507742511), (-0.26619791, -86.461050993), (2.041586213, -82.463852704), (-11.425936407, -22.282940485), (-15.103358833, -20.159779092), align=None)
        Polygon((-3.21460335, -27.0237571), (7.194647751, -73.538490685), (12.010892877, -65.196511647), (4.460017365, -31.454702616), align=None)
        Polygon((9.998535314, -34.652368297), (15.486616444, -59.176383442), (20.30286157, -50.834404404), (17.673156029, -39.083313814), align=None)
    extrude(amount=-CUT_EXTRUDE2_DEPTH, mode=Mode.SUBTRACT)


solid = part.part
